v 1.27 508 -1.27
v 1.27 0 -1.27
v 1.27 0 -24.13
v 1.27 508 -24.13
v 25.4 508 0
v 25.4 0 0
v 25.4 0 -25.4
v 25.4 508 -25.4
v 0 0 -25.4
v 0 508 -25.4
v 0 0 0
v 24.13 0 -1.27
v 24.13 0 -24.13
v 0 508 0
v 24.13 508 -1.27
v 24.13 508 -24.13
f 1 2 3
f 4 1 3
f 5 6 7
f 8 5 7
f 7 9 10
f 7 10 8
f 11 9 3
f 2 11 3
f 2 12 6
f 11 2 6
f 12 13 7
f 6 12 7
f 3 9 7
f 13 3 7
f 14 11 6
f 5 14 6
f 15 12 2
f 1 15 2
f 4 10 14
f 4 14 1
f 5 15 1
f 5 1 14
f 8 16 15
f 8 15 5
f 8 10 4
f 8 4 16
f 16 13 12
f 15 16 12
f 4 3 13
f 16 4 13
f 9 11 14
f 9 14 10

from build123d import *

# Parameters (mm, degrees)
SKETCH1_W           = 25.4
SKETCH1_H           = 25.4
BOSS_EXTRUDE1_DEPTH = 508


with BuildPart() as part:
    # Sketch1 → Boss-Extrude1 (new body)
    with BuildSketch(Plane(origin=(0, 0, 0), x_dir=(1, 0, 0), z_dir=(0, 1, 0))):
        with Locations((12.7, 12.7)):
            Rectangle(SKETCH1_W, SKETCH1_H)
        Polygon((1.27, 12.361459156), (1.27, 24.13), (12.7, 24.13), (24.13, 24.13), (24.13, 12.7), (24.13, 1.27), (12.7, 1.27), (1.27, 1.27), align=None, mode=Mode.SUBTRACT)
    extrude(amount=BOSS_EXTRUDE1_DEPTH)


solid = part.part
